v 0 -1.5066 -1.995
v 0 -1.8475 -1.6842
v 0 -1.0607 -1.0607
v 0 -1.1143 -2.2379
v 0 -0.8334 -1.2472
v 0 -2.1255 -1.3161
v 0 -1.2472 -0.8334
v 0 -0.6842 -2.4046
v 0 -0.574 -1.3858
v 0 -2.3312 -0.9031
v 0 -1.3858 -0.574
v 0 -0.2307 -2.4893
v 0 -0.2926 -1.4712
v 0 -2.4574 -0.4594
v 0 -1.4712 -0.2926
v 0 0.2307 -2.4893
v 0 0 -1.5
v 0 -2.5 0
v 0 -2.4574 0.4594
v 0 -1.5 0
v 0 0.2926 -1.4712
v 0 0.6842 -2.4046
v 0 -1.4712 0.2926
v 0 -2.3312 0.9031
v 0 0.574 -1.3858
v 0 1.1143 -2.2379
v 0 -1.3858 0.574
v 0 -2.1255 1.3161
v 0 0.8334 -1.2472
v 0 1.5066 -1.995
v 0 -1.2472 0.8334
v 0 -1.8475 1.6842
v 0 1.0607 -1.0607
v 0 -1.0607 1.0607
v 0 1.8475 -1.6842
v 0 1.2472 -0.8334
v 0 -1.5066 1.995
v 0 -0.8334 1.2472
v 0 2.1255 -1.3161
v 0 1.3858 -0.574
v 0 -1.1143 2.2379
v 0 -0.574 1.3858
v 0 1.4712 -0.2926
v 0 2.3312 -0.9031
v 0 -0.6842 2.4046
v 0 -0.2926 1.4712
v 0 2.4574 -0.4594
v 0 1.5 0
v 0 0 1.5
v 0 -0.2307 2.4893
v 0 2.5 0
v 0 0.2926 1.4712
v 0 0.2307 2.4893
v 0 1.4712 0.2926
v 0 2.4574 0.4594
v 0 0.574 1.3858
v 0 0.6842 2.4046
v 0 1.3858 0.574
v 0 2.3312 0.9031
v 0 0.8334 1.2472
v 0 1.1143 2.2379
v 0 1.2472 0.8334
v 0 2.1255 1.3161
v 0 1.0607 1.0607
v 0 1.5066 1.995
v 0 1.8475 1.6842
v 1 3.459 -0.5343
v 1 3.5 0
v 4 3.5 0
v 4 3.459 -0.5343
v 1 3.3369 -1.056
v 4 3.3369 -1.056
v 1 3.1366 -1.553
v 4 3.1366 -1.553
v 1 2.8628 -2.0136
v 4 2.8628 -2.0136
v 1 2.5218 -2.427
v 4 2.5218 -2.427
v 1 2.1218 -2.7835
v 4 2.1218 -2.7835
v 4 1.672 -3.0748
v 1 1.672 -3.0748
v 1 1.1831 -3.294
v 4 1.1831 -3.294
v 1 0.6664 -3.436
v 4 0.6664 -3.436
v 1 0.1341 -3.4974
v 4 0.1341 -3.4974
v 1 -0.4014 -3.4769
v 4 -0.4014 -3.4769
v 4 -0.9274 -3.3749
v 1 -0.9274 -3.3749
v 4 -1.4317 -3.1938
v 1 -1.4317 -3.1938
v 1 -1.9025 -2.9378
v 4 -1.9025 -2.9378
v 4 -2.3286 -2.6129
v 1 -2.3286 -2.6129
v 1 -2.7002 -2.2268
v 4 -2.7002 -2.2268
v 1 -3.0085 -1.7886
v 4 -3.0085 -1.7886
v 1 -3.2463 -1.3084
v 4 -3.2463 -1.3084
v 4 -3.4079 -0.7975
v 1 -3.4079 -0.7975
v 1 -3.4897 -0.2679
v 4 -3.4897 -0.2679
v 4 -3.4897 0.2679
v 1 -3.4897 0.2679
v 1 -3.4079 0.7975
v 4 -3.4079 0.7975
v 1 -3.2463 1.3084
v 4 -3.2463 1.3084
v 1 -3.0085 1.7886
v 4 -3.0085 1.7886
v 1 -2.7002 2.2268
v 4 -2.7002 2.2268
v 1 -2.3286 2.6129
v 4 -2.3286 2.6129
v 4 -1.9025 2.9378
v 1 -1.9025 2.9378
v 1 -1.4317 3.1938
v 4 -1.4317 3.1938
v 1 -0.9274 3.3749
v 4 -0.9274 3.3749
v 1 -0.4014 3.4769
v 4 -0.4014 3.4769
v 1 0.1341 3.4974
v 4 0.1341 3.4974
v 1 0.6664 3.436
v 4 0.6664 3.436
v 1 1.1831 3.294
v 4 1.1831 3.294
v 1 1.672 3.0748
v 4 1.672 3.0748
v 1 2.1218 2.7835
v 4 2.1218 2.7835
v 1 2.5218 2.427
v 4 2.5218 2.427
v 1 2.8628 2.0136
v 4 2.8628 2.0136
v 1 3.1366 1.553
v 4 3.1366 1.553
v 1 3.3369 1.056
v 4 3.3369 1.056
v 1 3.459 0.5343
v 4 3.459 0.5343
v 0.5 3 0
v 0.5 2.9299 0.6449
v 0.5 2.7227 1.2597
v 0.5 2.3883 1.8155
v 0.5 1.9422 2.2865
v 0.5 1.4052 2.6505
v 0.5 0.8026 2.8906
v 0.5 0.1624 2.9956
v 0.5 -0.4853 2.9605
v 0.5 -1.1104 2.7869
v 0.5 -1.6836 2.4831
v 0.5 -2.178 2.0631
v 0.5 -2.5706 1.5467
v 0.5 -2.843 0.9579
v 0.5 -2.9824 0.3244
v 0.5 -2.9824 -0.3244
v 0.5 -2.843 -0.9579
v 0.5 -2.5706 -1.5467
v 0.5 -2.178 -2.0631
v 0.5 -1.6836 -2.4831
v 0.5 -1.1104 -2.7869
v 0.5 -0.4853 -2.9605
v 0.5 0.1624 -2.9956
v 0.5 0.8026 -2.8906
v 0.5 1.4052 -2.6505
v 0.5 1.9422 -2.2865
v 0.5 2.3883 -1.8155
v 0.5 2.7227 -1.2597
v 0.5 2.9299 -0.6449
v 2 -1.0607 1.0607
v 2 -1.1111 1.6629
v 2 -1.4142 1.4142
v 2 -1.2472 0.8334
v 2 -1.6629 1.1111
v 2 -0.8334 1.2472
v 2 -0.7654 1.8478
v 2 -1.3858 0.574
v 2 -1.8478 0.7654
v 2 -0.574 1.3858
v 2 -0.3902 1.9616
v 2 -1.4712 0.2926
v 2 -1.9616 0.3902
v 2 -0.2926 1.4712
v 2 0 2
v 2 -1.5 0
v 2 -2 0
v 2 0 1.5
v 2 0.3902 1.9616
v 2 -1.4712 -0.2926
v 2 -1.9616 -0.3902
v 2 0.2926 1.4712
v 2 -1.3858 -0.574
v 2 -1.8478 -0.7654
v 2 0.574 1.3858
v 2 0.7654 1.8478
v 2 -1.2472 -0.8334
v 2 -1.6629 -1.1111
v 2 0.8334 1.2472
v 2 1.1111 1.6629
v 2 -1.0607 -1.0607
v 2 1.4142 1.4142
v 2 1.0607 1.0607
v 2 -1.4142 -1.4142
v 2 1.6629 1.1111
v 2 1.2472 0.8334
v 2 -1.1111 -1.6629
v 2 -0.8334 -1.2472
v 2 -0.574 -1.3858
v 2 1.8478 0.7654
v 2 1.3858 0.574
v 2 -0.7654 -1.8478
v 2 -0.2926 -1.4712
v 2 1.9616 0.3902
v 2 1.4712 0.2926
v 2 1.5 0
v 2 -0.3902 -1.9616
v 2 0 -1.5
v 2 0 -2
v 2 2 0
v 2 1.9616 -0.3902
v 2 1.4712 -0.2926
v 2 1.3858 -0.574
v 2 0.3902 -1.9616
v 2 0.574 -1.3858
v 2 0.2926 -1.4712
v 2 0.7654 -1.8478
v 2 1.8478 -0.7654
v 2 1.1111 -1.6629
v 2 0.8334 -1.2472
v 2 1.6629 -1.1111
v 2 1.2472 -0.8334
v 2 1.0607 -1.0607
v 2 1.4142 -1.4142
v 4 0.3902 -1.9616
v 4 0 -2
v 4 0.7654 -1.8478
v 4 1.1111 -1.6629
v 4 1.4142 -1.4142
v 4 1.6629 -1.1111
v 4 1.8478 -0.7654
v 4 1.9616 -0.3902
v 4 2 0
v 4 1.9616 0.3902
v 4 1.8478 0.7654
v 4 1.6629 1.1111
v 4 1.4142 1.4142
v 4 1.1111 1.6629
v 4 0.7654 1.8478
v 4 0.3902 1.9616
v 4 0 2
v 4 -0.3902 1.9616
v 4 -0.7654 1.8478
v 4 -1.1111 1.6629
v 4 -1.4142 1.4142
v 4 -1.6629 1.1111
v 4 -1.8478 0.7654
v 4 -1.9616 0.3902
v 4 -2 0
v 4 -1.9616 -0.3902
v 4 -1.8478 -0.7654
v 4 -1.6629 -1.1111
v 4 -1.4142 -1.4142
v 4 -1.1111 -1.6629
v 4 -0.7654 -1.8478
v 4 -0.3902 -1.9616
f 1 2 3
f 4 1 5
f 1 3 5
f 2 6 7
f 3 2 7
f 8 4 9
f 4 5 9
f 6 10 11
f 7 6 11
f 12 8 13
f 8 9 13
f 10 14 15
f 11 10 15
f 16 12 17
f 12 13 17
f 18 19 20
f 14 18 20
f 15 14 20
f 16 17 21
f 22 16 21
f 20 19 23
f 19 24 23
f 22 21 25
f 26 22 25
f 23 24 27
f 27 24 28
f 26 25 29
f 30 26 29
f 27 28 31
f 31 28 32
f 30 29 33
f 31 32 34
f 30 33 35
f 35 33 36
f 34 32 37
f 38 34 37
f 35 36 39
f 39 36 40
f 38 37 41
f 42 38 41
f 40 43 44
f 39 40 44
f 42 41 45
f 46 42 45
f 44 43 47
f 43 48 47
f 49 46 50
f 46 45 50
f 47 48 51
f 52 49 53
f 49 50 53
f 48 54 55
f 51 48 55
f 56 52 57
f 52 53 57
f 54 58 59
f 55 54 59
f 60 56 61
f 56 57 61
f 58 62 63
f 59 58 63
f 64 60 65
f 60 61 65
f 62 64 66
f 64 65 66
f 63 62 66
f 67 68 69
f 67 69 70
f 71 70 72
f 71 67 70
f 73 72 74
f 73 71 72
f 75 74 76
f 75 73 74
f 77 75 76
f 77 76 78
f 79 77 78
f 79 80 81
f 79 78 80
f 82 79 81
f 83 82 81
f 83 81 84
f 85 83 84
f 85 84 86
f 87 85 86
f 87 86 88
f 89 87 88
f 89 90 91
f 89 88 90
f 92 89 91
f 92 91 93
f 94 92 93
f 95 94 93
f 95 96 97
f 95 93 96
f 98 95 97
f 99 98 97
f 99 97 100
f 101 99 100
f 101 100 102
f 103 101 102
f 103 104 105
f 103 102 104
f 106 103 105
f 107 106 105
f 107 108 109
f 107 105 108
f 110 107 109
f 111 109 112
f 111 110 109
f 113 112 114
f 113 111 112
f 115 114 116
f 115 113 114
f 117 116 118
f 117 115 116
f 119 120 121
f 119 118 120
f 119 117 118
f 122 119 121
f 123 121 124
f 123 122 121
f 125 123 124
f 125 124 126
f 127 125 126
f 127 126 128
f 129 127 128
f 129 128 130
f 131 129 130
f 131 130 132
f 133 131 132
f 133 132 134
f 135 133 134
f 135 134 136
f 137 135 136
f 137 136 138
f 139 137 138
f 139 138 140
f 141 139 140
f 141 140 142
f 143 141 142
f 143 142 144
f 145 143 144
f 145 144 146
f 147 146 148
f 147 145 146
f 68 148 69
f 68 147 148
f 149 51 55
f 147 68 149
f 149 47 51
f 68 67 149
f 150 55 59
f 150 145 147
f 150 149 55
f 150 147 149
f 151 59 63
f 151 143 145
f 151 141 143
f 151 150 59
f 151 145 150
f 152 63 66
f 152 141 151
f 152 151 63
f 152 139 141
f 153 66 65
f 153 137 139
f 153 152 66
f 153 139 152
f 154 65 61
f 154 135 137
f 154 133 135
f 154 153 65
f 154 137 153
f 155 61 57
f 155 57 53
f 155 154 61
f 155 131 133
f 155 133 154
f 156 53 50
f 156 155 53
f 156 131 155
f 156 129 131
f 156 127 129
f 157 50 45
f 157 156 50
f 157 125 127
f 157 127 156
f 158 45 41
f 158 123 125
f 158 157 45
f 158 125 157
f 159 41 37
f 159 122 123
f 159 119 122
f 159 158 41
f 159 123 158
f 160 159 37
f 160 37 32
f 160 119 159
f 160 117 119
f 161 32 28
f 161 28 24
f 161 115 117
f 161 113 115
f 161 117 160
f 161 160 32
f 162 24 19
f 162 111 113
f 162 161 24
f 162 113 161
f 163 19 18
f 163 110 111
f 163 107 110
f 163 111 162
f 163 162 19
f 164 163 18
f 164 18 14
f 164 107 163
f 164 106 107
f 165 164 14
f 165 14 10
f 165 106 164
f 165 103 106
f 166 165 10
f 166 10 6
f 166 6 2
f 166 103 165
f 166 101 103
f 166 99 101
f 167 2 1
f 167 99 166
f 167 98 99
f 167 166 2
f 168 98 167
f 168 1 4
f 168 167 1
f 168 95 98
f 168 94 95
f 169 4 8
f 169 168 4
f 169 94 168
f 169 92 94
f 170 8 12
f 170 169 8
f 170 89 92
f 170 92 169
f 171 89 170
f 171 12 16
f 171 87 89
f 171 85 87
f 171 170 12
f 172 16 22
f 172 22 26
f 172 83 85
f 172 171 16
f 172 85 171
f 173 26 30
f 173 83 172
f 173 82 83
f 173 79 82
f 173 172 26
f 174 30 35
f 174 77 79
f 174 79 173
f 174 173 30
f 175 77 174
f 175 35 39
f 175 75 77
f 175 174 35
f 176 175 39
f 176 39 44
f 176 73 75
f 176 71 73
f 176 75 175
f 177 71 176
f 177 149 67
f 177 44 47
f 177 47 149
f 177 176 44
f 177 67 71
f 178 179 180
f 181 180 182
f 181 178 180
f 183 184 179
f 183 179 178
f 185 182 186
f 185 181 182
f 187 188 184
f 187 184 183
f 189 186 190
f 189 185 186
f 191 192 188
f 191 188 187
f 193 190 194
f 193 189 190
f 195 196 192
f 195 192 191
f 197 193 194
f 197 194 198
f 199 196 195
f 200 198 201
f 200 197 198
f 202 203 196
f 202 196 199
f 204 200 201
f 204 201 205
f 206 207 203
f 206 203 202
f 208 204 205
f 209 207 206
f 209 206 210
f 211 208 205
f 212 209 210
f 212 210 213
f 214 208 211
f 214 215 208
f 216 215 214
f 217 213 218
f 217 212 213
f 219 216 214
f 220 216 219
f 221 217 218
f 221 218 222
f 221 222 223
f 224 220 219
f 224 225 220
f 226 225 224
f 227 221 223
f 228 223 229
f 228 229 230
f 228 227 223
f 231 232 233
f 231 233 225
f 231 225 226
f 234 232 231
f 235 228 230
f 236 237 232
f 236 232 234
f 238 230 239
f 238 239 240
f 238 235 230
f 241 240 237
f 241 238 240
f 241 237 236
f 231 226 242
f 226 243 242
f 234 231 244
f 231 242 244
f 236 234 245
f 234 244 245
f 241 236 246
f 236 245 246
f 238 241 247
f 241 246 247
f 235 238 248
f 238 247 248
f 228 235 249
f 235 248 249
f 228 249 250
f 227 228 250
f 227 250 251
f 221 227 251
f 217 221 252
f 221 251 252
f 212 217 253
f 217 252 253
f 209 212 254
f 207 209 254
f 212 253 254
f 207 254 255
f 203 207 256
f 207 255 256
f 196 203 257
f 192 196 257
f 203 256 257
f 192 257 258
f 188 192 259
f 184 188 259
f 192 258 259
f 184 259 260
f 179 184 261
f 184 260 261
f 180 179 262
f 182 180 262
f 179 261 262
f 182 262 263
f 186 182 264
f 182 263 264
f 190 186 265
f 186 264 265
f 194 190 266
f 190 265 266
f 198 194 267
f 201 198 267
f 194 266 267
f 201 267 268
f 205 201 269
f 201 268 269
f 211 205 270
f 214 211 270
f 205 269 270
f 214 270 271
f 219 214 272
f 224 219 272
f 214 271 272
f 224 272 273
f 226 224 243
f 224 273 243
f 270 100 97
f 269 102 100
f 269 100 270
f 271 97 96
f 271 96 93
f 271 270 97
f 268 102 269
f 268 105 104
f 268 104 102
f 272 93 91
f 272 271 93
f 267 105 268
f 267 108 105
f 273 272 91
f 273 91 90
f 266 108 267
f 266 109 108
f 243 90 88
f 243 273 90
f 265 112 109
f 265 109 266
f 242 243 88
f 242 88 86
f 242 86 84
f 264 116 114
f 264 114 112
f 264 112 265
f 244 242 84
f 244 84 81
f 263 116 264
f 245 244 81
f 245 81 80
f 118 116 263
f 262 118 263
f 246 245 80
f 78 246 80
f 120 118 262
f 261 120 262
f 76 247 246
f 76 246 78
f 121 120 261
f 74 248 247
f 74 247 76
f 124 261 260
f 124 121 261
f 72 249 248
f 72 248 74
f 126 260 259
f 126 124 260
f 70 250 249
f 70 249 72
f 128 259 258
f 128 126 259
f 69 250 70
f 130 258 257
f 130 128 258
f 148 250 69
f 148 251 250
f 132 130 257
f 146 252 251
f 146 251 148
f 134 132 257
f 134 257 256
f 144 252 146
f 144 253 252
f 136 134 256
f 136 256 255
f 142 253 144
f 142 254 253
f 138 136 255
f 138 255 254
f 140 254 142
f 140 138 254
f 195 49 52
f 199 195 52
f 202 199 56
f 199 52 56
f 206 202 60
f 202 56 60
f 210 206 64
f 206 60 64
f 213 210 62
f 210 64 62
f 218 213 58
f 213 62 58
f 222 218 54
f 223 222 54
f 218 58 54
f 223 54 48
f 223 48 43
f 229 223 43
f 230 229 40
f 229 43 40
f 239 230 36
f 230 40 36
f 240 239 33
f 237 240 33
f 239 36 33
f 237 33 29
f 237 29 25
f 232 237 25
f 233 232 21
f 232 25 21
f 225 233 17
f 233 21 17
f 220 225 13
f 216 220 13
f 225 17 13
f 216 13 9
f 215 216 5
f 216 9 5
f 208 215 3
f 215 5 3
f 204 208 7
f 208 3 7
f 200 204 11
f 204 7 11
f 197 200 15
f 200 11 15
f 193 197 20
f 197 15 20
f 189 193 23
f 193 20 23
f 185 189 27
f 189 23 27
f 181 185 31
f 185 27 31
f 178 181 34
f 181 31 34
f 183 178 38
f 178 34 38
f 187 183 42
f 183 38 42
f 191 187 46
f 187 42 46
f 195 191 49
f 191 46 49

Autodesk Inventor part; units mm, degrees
ref_plane "YZ Plane" through (0, 0, 0) normal (1, 0, 0) x (0, 1, 0)
ref_plane "XZ Plane" through (0, 0, 0) normal (0, 1, 0) x (-1, 0, 0)
ref_plane "XY Plane" through (0, 0, 0) normal (0, 0, 1) x (1, 0, 0)
sketch "スケッチ1" plane through (0, 0, 0) normal (1, 0, 0) x (0, 1, 0)
  circle A0 centre (0, 0) radius 3.5
  dimension "d0" = 7
extrude "押し出し1" add sketch "スケッチ1" along normal blind 4
sketch "スケッチ2" plane through (4, 0, 0) normal (1, 0, 0) x (0, 0, -1)
  circle A0 centre (0, 0) radius 2
  dimension "d3" = 4
extrude "押し出し2" cut sketch "スケッチ2" against normal blind 2
sketch "スケッチ3" plane through (0, 0, 0) normal (-1, 0, 0) x (0, 0, 1)
  circle A0 centre (0, 0) radius 1.5
  dimension "d6" = 3
extrude "押し出し3" cut sketch "スケッチ3" against normal blind 2
chamfer "面取り1" distance 1 angle 45 1 edges at (0, -3.5, 0)
properties part number "MagnetStopper"
